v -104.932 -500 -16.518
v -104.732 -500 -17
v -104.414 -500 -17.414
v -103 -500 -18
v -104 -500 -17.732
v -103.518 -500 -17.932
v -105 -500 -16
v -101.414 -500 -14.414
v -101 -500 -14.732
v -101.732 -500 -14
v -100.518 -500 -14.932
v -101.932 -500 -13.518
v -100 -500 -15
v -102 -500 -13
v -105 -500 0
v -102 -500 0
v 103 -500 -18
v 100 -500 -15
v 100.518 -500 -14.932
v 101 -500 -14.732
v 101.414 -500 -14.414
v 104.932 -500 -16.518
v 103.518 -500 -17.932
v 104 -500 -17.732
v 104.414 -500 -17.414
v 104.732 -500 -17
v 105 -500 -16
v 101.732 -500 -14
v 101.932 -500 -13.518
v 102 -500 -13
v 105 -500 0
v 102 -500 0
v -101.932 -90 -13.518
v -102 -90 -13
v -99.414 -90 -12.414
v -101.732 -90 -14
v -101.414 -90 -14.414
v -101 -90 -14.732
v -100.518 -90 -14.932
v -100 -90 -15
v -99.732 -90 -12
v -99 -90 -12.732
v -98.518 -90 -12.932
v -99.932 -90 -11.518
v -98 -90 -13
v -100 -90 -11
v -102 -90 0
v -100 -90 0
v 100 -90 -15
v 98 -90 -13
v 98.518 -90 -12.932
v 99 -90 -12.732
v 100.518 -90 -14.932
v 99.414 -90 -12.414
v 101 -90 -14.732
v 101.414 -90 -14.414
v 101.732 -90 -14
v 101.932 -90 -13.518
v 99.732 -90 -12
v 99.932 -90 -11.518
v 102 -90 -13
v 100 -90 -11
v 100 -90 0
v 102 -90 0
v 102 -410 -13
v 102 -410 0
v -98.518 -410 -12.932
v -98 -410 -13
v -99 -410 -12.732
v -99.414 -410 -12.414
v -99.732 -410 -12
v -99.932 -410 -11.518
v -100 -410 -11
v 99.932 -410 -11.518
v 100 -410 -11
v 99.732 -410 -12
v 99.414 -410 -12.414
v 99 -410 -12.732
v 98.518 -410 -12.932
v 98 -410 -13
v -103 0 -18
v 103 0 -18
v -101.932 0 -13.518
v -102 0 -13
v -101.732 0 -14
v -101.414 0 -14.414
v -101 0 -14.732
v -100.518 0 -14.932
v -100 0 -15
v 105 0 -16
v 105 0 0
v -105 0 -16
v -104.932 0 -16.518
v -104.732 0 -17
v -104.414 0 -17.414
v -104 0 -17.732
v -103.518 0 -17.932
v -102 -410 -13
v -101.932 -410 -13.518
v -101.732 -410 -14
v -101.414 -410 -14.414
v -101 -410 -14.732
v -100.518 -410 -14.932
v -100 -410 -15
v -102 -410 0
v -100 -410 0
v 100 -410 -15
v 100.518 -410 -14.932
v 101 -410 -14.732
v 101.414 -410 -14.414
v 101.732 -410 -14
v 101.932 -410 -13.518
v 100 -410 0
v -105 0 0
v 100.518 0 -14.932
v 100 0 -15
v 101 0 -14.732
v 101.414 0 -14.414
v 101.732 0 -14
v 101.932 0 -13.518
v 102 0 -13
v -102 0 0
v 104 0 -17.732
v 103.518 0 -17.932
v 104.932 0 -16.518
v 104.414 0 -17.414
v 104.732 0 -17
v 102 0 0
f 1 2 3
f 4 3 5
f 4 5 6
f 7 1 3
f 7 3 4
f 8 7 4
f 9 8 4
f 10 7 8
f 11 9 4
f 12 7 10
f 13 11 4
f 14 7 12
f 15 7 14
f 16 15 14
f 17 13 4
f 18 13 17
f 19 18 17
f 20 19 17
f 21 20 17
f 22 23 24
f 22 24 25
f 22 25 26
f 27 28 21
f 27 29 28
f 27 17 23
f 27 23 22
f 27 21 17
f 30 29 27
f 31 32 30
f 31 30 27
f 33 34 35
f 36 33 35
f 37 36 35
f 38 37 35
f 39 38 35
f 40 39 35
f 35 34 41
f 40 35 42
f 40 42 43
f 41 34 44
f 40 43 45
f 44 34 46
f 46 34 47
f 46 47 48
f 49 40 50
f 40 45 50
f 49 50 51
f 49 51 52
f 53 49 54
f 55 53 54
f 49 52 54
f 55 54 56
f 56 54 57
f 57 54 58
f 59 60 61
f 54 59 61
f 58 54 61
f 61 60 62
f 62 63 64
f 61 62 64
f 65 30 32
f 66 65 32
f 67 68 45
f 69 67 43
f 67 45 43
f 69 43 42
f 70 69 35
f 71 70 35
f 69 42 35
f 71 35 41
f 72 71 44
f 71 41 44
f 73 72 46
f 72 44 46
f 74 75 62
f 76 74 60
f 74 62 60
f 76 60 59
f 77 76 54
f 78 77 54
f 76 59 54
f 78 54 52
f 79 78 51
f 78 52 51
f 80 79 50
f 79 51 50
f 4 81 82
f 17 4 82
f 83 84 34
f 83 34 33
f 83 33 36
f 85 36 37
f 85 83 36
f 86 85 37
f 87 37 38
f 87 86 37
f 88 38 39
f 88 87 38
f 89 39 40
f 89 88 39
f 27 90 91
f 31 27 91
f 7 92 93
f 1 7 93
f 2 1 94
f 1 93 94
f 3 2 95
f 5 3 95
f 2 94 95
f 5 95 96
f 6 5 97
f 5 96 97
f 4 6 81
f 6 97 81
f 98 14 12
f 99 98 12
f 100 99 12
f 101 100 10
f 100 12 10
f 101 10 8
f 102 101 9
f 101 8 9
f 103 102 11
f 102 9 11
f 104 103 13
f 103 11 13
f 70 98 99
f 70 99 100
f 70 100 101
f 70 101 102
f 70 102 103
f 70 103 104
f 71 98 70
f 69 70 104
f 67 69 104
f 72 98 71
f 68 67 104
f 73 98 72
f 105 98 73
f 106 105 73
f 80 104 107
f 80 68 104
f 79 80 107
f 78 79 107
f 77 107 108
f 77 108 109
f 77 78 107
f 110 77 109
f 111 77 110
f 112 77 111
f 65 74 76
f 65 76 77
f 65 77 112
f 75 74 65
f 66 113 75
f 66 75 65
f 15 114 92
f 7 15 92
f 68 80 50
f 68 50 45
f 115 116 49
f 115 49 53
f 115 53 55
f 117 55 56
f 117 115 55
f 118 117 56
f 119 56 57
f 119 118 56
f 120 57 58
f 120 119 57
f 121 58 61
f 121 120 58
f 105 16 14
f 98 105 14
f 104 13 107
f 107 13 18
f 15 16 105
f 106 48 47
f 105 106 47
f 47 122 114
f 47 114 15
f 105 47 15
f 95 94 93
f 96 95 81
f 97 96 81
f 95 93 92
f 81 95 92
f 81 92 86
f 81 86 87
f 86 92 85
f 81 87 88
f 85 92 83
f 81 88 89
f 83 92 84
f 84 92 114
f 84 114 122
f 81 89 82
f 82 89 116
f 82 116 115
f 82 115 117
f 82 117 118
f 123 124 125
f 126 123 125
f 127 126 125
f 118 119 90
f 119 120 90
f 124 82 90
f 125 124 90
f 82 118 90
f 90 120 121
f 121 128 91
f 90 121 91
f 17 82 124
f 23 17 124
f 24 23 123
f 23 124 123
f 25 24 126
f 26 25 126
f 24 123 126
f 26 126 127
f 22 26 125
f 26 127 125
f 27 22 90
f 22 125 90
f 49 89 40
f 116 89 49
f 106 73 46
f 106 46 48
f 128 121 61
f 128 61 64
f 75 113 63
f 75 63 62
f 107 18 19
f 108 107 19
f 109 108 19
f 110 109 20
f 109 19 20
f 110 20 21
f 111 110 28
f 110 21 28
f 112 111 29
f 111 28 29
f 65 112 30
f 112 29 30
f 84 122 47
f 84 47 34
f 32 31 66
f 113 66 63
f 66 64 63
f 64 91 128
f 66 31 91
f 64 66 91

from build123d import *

# Parameters (mm, degrees)
F1_DEPTH = 500
F2_DEPTH = 90


# Not quite as in the source:
# - a pattern or mirror of a feature is missing from the dataset's text; its kind, count and spacing are read off the source's solid


with BuildPart() as f1:
    # F0 (on Front) → F1 (new body)
    with BuildSketch(Plane.XZ):
        with BuildLine():
            Line((102, 0), (100, 0))
            Line((100, 0), (100, -11))
            ThreePointArc((100, -11), (99.4142135624, -12.4142135624), (98, -13))
            Line((98, -13), (0, -13))
            Line((0, -13), (-98, -13))
            ThreePointArc((-98, -13), (-99.4142135624, -12.4142135624), (-100, -11))
            Line((-100, -11), (-100, 0))
            Line((-100, 0), (-102, 0))
            Line((-102, 0), (-102, -13))
            ThreePointArc((-102, -13), (-101.4142135624, -14.4142135624), (-100, -15))
            Line((-100, -15), (100, -15))
            ThreePointArc((100, -15), (101.4142135624, -14.4142135624), (102, -13))
            Line((102, -13), (102, 0))
        make_face()
        with BuildLine():
            Line((105, 0), (102, 0))
            Line((102, 0), (102, -13))
            ThreePointArc((102, -13), (101.4142135624, -14.4142135624), (100, -15))
            Line((100, -15), (-100, -15))
            ThreePointArc((-100, -15), (-101.4142135624, -14.4142135624), (-102, -13))
            Line((-102, -13), (-102, 0))
            Line((-102, 0), (-105, 0))
            Line((-105, 0), (-105, -16))
            ThreePointArc((-105, -16), (-104.4142135624, -17.4142135624), (-103, -18))
            Line((-103, -18), (0, -18))
            Line((0, -18), (103, -18))
            ThreePointArc((103, -18), (104.4142135624, -17.4142135624), (105, -16))
            Line((105, -16), (105, 0))
        make_face()
    extrude(amount=F1_DEPTH)

    # F0 (on Front) → F2 (cut)
    with BuildSketch(Plane.XZ):
        with BuildLine():
            Line((102, 0), (100, 0))
            Line((100, 0), (100, -11))
            ThreePointArc((100, -11), (99.4142135624, -12.4142135624), (98, -13))
            Line((98, -13), (0, -13))
            Line((0, -13), (-98, -13))
            ThreePointArc((-98, -13), (-99.4142135624, -12.4142135624), (-100, -11))
            Line((-100, -11), (-100, 0))
            Line((-100, 0), (-102, 0))
            Line((-102, 0), (-102, -13))
            ThreePointArc((-102, -13), (-101.4142135624, -14.4142135624), (-100, -15))
            Line((-100, -15), (100, -15))
            ThreePointArc((100, -15), (101.4142135624, -14.4142135624), (102, -13))
            Line((102, -13), (102, 0))
        make_face()
    f2 = extrude(amount=F2_DEPTH, mode=Mode.SUBTRACT)

    # F2_copies: F2 across plane
    add(f2.mirror(Plane(origin=(0, -250, 0), x_dir=(0, 0, -1), z_dir=(0, -1, 0))), mode=Mode.SUBTRACT)


solid = f1.part
